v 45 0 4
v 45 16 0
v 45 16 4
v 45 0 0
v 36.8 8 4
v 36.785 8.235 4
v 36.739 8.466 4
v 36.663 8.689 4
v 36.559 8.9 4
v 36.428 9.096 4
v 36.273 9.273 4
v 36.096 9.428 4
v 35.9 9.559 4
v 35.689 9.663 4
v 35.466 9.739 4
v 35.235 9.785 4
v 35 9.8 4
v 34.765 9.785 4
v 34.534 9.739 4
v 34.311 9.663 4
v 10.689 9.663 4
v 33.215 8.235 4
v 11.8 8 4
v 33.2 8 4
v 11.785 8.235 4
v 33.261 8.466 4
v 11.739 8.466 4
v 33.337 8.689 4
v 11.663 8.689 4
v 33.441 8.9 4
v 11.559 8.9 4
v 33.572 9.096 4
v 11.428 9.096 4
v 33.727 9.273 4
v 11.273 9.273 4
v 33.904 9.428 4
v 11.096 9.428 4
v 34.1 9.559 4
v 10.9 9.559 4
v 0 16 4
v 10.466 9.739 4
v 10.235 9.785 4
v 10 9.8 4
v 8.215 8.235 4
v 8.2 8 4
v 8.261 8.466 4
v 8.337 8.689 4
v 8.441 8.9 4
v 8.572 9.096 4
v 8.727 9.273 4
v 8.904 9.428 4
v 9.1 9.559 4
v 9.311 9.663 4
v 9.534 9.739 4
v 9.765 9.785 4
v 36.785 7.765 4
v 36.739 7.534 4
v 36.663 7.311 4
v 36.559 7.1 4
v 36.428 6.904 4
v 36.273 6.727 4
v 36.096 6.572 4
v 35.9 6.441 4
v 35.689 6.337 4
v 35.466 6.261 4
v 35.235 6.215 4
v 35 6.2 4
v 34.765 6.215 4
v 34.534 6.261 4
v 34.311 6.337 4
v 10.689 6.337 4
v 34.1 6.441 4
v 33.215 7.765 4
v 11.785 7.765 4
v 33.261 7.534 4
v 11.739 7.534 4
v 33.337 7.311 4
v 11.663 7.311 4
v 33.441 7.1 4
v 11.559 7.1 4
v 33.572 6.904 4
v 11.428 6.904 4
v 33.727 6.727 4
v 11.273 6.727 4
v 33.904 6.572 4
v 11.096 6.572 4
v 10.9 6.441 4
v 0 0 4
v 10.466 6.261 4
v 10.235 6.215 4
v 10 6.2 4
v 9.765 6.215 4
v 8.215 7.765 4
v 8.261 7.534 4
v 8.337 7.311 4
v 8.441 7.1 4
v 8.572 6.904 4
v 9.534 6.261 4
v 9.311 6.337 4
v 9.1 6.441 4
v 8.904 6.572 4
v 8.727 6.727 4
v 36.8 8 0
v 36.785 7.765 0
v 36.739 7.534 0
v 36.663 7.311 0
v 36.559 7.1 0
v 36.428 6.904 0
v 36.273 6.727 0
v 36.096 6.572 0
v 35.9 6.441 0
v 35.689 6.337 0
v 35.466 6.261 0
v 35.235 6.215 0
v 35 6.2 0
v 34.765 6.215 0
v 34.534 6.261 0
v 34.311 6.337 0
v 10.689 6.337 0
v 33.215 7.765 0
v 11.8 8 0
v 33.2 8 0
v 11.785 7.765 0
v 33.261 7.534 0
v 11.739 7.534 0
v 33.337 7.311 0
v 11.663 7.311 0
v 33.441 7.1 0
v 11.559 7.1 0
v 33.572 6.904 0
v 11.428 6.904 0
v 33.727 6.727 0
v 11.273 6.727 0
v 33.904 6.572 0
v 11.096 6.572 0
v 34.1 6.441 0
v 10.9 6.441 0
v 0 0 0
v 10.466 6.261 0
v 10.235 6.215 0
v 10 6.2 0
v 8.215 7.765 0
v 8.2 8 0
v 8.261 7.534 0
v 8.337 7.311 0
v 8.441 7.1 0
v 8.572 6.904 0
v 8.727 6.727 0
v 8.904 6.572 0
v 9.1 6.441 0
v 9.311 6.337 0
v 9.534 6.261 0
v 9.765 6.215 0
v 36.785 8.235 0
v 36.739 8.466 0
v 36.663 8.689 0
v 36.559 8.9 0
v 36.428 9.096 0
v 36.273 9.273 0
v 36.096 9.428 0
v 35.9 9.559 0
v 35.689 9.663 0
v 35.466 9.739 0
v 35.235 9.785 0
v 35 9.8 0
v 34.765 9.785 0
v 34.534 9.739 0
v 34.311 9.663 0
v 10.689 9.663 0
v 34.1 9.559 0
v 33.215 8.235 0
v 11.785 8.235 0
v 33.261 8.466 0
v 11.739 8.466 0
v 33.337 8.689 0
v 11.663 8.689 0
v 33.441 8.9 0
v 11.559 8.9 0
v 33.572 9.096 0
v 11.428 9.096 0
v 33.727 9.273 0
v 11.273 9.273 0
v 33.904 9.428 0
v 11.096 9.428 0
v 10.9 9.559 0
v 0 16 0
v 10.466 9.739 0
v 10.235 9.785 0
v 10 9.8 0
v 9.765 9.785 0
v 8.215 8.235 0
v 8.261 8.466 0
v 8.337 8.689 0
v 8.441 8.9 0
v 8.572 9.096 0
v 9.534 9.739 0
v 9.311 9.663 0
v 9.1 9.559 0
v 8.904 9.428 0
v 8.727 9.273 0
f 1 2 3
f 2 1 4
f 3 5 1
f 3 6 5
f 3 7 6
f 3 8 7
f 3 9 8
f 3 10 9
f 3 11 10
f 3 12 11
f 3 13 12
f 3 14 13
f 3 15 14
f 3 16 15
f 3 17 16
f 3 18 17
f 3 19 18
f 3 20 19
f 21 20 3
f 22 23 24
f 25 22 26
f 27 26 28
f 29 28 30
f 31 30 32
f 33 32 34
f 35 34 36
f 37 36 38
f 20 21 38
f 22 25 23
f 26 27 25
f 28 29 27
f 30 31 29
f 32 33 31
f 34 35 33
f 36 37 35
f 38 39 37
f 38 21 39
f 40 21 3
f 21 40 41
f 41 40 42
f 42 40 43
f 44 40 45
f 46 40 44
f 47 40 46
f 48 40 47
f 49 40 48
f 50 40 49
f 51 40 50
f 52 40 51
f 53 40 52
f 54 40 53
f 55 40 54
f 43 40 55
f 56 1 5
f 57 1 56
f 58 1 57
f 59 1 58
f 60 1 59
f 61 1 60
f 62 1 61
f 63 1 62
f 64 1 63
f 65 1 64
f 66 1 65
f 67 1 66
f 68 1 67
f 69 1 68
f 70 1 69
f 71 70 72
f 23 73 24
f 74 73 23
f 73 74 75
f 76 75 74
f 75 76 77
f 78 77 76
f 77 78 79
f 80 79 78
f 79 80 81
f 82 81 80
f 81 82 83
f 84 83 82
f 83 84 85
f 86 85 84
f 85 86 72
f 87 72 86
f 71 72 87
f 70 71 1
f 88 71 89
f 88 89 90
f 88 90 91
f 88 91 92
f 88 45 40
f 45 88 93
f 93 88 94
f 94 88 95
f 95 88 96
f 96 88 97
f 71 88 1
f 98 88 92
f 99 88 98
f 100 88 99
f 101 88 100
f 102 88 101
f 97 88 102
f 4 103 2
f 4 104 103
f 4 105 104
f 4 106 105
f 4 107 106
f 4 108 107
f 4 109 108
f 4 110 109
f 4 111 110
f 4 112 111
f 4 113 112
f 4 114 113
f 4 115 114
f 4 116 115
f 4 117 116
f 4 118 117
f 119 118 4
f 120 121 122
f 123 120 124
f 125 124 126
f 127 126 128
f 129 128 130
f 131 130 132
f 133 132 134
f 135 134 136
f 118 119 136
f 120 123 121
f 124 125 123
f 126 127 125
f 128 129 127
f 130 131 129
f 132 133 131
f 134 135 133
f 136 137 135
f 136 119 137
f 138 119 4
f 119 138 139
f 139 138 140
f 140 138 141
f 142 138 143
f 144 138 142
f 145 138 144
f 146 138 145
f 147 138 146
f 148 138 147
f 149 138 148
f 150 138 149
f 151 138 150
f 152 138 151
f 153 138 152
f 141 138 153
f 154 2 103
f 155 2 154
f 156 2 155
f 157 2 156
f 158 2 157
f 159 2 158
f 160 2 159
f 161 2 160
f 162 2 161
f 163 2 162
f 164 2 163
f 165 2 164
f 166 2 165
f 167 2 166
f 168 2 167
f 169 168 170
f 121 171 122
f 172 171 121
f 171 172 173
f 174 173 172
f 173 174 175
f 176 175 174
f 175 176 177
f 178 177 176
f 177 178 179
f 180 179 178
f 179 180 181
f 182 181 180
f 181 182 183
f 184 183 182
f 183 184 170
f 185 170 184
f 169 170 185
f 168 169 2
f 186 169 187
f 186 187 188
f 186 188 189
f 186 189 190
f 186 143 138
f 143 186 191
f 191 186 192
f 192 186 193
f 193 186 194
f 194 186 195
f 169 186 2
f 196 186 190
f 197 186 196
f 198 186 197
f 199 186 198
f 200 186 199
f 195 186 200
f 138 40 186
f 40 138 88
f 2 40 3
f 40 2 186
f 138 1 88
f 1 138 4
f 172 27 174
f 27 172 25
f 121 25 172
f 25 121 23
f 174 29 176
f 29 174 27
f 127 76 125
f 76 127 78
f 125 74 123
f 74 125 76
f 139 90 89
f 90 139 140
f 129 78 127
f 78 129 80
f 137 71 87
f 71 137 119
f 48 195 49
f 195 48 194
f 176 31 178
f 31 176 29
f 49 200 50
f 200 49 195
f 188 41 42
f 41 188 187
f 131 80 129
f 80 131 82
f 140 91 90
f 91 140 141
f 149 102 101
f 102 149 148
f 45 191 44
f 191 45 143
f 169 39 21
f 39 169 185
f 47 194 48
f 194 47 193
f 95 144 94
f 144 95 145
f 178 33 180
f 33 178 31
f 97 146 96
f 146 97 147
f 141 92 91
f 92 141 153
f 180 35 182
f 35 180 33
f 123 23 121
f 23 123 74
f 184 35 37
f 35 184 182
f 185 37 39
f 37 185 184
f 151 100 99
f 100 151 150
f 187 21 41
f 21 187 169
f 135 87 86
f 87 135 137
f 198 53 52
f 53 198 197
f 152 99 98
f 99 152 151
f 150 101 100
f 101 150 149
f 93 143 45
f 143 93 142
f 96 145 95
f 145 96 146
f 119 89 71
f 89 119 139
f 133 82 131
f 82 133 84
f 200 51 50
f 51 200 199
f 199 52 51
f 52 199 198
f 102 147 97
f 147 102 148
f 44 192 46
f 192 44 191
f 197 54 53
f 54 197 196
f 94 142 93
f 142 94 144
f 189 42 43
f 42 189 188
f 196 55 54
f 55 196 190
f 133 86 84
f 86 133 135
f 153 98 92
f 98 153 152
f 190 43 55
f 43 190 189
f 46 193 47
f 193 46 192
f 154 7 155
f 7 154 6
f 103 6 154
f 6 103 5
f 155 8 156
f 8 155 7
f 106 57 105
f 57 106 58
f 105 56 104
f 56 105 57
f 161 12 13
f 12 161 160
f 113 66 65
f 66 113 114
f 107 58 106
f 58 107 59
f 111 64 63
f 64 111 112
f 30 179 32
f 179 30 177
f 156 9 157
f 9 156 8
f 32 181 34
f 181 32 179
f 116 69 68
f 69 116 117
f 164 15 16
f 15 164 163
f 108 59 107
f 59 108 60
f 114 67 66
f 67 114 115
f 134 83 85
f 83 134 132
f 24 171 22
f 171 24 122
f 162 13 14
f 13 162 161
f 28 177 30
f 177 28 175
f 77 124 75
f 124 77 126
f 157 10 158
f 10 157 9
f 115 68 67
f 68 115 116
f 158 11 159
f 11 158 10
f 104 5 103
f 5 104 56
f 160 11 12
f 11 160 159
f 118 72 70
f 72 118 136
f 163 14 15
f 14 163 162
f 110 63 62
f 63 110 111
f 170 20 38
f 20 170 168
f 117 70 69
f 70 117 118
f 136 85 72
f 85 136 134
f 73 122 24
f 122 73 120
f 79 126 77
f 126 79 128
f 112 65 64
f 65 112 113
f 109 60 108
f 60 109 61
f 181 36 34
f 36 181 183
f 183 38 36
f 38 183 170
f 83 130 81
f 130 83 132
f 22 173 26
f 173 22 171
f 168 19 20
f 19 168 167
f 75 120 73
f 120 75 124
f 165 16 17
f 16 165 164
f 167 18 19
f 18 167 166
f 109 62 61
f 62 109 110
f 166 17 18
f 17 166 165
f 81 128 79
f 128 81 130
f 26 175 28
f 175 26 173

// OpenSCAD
$fn=48;
difference(){cube([45,16,4]);translate([10,8,-1])cylinder(h=6,r=1.8);translate([35,8,-1])cylinder(h=6,r=1.8);}
